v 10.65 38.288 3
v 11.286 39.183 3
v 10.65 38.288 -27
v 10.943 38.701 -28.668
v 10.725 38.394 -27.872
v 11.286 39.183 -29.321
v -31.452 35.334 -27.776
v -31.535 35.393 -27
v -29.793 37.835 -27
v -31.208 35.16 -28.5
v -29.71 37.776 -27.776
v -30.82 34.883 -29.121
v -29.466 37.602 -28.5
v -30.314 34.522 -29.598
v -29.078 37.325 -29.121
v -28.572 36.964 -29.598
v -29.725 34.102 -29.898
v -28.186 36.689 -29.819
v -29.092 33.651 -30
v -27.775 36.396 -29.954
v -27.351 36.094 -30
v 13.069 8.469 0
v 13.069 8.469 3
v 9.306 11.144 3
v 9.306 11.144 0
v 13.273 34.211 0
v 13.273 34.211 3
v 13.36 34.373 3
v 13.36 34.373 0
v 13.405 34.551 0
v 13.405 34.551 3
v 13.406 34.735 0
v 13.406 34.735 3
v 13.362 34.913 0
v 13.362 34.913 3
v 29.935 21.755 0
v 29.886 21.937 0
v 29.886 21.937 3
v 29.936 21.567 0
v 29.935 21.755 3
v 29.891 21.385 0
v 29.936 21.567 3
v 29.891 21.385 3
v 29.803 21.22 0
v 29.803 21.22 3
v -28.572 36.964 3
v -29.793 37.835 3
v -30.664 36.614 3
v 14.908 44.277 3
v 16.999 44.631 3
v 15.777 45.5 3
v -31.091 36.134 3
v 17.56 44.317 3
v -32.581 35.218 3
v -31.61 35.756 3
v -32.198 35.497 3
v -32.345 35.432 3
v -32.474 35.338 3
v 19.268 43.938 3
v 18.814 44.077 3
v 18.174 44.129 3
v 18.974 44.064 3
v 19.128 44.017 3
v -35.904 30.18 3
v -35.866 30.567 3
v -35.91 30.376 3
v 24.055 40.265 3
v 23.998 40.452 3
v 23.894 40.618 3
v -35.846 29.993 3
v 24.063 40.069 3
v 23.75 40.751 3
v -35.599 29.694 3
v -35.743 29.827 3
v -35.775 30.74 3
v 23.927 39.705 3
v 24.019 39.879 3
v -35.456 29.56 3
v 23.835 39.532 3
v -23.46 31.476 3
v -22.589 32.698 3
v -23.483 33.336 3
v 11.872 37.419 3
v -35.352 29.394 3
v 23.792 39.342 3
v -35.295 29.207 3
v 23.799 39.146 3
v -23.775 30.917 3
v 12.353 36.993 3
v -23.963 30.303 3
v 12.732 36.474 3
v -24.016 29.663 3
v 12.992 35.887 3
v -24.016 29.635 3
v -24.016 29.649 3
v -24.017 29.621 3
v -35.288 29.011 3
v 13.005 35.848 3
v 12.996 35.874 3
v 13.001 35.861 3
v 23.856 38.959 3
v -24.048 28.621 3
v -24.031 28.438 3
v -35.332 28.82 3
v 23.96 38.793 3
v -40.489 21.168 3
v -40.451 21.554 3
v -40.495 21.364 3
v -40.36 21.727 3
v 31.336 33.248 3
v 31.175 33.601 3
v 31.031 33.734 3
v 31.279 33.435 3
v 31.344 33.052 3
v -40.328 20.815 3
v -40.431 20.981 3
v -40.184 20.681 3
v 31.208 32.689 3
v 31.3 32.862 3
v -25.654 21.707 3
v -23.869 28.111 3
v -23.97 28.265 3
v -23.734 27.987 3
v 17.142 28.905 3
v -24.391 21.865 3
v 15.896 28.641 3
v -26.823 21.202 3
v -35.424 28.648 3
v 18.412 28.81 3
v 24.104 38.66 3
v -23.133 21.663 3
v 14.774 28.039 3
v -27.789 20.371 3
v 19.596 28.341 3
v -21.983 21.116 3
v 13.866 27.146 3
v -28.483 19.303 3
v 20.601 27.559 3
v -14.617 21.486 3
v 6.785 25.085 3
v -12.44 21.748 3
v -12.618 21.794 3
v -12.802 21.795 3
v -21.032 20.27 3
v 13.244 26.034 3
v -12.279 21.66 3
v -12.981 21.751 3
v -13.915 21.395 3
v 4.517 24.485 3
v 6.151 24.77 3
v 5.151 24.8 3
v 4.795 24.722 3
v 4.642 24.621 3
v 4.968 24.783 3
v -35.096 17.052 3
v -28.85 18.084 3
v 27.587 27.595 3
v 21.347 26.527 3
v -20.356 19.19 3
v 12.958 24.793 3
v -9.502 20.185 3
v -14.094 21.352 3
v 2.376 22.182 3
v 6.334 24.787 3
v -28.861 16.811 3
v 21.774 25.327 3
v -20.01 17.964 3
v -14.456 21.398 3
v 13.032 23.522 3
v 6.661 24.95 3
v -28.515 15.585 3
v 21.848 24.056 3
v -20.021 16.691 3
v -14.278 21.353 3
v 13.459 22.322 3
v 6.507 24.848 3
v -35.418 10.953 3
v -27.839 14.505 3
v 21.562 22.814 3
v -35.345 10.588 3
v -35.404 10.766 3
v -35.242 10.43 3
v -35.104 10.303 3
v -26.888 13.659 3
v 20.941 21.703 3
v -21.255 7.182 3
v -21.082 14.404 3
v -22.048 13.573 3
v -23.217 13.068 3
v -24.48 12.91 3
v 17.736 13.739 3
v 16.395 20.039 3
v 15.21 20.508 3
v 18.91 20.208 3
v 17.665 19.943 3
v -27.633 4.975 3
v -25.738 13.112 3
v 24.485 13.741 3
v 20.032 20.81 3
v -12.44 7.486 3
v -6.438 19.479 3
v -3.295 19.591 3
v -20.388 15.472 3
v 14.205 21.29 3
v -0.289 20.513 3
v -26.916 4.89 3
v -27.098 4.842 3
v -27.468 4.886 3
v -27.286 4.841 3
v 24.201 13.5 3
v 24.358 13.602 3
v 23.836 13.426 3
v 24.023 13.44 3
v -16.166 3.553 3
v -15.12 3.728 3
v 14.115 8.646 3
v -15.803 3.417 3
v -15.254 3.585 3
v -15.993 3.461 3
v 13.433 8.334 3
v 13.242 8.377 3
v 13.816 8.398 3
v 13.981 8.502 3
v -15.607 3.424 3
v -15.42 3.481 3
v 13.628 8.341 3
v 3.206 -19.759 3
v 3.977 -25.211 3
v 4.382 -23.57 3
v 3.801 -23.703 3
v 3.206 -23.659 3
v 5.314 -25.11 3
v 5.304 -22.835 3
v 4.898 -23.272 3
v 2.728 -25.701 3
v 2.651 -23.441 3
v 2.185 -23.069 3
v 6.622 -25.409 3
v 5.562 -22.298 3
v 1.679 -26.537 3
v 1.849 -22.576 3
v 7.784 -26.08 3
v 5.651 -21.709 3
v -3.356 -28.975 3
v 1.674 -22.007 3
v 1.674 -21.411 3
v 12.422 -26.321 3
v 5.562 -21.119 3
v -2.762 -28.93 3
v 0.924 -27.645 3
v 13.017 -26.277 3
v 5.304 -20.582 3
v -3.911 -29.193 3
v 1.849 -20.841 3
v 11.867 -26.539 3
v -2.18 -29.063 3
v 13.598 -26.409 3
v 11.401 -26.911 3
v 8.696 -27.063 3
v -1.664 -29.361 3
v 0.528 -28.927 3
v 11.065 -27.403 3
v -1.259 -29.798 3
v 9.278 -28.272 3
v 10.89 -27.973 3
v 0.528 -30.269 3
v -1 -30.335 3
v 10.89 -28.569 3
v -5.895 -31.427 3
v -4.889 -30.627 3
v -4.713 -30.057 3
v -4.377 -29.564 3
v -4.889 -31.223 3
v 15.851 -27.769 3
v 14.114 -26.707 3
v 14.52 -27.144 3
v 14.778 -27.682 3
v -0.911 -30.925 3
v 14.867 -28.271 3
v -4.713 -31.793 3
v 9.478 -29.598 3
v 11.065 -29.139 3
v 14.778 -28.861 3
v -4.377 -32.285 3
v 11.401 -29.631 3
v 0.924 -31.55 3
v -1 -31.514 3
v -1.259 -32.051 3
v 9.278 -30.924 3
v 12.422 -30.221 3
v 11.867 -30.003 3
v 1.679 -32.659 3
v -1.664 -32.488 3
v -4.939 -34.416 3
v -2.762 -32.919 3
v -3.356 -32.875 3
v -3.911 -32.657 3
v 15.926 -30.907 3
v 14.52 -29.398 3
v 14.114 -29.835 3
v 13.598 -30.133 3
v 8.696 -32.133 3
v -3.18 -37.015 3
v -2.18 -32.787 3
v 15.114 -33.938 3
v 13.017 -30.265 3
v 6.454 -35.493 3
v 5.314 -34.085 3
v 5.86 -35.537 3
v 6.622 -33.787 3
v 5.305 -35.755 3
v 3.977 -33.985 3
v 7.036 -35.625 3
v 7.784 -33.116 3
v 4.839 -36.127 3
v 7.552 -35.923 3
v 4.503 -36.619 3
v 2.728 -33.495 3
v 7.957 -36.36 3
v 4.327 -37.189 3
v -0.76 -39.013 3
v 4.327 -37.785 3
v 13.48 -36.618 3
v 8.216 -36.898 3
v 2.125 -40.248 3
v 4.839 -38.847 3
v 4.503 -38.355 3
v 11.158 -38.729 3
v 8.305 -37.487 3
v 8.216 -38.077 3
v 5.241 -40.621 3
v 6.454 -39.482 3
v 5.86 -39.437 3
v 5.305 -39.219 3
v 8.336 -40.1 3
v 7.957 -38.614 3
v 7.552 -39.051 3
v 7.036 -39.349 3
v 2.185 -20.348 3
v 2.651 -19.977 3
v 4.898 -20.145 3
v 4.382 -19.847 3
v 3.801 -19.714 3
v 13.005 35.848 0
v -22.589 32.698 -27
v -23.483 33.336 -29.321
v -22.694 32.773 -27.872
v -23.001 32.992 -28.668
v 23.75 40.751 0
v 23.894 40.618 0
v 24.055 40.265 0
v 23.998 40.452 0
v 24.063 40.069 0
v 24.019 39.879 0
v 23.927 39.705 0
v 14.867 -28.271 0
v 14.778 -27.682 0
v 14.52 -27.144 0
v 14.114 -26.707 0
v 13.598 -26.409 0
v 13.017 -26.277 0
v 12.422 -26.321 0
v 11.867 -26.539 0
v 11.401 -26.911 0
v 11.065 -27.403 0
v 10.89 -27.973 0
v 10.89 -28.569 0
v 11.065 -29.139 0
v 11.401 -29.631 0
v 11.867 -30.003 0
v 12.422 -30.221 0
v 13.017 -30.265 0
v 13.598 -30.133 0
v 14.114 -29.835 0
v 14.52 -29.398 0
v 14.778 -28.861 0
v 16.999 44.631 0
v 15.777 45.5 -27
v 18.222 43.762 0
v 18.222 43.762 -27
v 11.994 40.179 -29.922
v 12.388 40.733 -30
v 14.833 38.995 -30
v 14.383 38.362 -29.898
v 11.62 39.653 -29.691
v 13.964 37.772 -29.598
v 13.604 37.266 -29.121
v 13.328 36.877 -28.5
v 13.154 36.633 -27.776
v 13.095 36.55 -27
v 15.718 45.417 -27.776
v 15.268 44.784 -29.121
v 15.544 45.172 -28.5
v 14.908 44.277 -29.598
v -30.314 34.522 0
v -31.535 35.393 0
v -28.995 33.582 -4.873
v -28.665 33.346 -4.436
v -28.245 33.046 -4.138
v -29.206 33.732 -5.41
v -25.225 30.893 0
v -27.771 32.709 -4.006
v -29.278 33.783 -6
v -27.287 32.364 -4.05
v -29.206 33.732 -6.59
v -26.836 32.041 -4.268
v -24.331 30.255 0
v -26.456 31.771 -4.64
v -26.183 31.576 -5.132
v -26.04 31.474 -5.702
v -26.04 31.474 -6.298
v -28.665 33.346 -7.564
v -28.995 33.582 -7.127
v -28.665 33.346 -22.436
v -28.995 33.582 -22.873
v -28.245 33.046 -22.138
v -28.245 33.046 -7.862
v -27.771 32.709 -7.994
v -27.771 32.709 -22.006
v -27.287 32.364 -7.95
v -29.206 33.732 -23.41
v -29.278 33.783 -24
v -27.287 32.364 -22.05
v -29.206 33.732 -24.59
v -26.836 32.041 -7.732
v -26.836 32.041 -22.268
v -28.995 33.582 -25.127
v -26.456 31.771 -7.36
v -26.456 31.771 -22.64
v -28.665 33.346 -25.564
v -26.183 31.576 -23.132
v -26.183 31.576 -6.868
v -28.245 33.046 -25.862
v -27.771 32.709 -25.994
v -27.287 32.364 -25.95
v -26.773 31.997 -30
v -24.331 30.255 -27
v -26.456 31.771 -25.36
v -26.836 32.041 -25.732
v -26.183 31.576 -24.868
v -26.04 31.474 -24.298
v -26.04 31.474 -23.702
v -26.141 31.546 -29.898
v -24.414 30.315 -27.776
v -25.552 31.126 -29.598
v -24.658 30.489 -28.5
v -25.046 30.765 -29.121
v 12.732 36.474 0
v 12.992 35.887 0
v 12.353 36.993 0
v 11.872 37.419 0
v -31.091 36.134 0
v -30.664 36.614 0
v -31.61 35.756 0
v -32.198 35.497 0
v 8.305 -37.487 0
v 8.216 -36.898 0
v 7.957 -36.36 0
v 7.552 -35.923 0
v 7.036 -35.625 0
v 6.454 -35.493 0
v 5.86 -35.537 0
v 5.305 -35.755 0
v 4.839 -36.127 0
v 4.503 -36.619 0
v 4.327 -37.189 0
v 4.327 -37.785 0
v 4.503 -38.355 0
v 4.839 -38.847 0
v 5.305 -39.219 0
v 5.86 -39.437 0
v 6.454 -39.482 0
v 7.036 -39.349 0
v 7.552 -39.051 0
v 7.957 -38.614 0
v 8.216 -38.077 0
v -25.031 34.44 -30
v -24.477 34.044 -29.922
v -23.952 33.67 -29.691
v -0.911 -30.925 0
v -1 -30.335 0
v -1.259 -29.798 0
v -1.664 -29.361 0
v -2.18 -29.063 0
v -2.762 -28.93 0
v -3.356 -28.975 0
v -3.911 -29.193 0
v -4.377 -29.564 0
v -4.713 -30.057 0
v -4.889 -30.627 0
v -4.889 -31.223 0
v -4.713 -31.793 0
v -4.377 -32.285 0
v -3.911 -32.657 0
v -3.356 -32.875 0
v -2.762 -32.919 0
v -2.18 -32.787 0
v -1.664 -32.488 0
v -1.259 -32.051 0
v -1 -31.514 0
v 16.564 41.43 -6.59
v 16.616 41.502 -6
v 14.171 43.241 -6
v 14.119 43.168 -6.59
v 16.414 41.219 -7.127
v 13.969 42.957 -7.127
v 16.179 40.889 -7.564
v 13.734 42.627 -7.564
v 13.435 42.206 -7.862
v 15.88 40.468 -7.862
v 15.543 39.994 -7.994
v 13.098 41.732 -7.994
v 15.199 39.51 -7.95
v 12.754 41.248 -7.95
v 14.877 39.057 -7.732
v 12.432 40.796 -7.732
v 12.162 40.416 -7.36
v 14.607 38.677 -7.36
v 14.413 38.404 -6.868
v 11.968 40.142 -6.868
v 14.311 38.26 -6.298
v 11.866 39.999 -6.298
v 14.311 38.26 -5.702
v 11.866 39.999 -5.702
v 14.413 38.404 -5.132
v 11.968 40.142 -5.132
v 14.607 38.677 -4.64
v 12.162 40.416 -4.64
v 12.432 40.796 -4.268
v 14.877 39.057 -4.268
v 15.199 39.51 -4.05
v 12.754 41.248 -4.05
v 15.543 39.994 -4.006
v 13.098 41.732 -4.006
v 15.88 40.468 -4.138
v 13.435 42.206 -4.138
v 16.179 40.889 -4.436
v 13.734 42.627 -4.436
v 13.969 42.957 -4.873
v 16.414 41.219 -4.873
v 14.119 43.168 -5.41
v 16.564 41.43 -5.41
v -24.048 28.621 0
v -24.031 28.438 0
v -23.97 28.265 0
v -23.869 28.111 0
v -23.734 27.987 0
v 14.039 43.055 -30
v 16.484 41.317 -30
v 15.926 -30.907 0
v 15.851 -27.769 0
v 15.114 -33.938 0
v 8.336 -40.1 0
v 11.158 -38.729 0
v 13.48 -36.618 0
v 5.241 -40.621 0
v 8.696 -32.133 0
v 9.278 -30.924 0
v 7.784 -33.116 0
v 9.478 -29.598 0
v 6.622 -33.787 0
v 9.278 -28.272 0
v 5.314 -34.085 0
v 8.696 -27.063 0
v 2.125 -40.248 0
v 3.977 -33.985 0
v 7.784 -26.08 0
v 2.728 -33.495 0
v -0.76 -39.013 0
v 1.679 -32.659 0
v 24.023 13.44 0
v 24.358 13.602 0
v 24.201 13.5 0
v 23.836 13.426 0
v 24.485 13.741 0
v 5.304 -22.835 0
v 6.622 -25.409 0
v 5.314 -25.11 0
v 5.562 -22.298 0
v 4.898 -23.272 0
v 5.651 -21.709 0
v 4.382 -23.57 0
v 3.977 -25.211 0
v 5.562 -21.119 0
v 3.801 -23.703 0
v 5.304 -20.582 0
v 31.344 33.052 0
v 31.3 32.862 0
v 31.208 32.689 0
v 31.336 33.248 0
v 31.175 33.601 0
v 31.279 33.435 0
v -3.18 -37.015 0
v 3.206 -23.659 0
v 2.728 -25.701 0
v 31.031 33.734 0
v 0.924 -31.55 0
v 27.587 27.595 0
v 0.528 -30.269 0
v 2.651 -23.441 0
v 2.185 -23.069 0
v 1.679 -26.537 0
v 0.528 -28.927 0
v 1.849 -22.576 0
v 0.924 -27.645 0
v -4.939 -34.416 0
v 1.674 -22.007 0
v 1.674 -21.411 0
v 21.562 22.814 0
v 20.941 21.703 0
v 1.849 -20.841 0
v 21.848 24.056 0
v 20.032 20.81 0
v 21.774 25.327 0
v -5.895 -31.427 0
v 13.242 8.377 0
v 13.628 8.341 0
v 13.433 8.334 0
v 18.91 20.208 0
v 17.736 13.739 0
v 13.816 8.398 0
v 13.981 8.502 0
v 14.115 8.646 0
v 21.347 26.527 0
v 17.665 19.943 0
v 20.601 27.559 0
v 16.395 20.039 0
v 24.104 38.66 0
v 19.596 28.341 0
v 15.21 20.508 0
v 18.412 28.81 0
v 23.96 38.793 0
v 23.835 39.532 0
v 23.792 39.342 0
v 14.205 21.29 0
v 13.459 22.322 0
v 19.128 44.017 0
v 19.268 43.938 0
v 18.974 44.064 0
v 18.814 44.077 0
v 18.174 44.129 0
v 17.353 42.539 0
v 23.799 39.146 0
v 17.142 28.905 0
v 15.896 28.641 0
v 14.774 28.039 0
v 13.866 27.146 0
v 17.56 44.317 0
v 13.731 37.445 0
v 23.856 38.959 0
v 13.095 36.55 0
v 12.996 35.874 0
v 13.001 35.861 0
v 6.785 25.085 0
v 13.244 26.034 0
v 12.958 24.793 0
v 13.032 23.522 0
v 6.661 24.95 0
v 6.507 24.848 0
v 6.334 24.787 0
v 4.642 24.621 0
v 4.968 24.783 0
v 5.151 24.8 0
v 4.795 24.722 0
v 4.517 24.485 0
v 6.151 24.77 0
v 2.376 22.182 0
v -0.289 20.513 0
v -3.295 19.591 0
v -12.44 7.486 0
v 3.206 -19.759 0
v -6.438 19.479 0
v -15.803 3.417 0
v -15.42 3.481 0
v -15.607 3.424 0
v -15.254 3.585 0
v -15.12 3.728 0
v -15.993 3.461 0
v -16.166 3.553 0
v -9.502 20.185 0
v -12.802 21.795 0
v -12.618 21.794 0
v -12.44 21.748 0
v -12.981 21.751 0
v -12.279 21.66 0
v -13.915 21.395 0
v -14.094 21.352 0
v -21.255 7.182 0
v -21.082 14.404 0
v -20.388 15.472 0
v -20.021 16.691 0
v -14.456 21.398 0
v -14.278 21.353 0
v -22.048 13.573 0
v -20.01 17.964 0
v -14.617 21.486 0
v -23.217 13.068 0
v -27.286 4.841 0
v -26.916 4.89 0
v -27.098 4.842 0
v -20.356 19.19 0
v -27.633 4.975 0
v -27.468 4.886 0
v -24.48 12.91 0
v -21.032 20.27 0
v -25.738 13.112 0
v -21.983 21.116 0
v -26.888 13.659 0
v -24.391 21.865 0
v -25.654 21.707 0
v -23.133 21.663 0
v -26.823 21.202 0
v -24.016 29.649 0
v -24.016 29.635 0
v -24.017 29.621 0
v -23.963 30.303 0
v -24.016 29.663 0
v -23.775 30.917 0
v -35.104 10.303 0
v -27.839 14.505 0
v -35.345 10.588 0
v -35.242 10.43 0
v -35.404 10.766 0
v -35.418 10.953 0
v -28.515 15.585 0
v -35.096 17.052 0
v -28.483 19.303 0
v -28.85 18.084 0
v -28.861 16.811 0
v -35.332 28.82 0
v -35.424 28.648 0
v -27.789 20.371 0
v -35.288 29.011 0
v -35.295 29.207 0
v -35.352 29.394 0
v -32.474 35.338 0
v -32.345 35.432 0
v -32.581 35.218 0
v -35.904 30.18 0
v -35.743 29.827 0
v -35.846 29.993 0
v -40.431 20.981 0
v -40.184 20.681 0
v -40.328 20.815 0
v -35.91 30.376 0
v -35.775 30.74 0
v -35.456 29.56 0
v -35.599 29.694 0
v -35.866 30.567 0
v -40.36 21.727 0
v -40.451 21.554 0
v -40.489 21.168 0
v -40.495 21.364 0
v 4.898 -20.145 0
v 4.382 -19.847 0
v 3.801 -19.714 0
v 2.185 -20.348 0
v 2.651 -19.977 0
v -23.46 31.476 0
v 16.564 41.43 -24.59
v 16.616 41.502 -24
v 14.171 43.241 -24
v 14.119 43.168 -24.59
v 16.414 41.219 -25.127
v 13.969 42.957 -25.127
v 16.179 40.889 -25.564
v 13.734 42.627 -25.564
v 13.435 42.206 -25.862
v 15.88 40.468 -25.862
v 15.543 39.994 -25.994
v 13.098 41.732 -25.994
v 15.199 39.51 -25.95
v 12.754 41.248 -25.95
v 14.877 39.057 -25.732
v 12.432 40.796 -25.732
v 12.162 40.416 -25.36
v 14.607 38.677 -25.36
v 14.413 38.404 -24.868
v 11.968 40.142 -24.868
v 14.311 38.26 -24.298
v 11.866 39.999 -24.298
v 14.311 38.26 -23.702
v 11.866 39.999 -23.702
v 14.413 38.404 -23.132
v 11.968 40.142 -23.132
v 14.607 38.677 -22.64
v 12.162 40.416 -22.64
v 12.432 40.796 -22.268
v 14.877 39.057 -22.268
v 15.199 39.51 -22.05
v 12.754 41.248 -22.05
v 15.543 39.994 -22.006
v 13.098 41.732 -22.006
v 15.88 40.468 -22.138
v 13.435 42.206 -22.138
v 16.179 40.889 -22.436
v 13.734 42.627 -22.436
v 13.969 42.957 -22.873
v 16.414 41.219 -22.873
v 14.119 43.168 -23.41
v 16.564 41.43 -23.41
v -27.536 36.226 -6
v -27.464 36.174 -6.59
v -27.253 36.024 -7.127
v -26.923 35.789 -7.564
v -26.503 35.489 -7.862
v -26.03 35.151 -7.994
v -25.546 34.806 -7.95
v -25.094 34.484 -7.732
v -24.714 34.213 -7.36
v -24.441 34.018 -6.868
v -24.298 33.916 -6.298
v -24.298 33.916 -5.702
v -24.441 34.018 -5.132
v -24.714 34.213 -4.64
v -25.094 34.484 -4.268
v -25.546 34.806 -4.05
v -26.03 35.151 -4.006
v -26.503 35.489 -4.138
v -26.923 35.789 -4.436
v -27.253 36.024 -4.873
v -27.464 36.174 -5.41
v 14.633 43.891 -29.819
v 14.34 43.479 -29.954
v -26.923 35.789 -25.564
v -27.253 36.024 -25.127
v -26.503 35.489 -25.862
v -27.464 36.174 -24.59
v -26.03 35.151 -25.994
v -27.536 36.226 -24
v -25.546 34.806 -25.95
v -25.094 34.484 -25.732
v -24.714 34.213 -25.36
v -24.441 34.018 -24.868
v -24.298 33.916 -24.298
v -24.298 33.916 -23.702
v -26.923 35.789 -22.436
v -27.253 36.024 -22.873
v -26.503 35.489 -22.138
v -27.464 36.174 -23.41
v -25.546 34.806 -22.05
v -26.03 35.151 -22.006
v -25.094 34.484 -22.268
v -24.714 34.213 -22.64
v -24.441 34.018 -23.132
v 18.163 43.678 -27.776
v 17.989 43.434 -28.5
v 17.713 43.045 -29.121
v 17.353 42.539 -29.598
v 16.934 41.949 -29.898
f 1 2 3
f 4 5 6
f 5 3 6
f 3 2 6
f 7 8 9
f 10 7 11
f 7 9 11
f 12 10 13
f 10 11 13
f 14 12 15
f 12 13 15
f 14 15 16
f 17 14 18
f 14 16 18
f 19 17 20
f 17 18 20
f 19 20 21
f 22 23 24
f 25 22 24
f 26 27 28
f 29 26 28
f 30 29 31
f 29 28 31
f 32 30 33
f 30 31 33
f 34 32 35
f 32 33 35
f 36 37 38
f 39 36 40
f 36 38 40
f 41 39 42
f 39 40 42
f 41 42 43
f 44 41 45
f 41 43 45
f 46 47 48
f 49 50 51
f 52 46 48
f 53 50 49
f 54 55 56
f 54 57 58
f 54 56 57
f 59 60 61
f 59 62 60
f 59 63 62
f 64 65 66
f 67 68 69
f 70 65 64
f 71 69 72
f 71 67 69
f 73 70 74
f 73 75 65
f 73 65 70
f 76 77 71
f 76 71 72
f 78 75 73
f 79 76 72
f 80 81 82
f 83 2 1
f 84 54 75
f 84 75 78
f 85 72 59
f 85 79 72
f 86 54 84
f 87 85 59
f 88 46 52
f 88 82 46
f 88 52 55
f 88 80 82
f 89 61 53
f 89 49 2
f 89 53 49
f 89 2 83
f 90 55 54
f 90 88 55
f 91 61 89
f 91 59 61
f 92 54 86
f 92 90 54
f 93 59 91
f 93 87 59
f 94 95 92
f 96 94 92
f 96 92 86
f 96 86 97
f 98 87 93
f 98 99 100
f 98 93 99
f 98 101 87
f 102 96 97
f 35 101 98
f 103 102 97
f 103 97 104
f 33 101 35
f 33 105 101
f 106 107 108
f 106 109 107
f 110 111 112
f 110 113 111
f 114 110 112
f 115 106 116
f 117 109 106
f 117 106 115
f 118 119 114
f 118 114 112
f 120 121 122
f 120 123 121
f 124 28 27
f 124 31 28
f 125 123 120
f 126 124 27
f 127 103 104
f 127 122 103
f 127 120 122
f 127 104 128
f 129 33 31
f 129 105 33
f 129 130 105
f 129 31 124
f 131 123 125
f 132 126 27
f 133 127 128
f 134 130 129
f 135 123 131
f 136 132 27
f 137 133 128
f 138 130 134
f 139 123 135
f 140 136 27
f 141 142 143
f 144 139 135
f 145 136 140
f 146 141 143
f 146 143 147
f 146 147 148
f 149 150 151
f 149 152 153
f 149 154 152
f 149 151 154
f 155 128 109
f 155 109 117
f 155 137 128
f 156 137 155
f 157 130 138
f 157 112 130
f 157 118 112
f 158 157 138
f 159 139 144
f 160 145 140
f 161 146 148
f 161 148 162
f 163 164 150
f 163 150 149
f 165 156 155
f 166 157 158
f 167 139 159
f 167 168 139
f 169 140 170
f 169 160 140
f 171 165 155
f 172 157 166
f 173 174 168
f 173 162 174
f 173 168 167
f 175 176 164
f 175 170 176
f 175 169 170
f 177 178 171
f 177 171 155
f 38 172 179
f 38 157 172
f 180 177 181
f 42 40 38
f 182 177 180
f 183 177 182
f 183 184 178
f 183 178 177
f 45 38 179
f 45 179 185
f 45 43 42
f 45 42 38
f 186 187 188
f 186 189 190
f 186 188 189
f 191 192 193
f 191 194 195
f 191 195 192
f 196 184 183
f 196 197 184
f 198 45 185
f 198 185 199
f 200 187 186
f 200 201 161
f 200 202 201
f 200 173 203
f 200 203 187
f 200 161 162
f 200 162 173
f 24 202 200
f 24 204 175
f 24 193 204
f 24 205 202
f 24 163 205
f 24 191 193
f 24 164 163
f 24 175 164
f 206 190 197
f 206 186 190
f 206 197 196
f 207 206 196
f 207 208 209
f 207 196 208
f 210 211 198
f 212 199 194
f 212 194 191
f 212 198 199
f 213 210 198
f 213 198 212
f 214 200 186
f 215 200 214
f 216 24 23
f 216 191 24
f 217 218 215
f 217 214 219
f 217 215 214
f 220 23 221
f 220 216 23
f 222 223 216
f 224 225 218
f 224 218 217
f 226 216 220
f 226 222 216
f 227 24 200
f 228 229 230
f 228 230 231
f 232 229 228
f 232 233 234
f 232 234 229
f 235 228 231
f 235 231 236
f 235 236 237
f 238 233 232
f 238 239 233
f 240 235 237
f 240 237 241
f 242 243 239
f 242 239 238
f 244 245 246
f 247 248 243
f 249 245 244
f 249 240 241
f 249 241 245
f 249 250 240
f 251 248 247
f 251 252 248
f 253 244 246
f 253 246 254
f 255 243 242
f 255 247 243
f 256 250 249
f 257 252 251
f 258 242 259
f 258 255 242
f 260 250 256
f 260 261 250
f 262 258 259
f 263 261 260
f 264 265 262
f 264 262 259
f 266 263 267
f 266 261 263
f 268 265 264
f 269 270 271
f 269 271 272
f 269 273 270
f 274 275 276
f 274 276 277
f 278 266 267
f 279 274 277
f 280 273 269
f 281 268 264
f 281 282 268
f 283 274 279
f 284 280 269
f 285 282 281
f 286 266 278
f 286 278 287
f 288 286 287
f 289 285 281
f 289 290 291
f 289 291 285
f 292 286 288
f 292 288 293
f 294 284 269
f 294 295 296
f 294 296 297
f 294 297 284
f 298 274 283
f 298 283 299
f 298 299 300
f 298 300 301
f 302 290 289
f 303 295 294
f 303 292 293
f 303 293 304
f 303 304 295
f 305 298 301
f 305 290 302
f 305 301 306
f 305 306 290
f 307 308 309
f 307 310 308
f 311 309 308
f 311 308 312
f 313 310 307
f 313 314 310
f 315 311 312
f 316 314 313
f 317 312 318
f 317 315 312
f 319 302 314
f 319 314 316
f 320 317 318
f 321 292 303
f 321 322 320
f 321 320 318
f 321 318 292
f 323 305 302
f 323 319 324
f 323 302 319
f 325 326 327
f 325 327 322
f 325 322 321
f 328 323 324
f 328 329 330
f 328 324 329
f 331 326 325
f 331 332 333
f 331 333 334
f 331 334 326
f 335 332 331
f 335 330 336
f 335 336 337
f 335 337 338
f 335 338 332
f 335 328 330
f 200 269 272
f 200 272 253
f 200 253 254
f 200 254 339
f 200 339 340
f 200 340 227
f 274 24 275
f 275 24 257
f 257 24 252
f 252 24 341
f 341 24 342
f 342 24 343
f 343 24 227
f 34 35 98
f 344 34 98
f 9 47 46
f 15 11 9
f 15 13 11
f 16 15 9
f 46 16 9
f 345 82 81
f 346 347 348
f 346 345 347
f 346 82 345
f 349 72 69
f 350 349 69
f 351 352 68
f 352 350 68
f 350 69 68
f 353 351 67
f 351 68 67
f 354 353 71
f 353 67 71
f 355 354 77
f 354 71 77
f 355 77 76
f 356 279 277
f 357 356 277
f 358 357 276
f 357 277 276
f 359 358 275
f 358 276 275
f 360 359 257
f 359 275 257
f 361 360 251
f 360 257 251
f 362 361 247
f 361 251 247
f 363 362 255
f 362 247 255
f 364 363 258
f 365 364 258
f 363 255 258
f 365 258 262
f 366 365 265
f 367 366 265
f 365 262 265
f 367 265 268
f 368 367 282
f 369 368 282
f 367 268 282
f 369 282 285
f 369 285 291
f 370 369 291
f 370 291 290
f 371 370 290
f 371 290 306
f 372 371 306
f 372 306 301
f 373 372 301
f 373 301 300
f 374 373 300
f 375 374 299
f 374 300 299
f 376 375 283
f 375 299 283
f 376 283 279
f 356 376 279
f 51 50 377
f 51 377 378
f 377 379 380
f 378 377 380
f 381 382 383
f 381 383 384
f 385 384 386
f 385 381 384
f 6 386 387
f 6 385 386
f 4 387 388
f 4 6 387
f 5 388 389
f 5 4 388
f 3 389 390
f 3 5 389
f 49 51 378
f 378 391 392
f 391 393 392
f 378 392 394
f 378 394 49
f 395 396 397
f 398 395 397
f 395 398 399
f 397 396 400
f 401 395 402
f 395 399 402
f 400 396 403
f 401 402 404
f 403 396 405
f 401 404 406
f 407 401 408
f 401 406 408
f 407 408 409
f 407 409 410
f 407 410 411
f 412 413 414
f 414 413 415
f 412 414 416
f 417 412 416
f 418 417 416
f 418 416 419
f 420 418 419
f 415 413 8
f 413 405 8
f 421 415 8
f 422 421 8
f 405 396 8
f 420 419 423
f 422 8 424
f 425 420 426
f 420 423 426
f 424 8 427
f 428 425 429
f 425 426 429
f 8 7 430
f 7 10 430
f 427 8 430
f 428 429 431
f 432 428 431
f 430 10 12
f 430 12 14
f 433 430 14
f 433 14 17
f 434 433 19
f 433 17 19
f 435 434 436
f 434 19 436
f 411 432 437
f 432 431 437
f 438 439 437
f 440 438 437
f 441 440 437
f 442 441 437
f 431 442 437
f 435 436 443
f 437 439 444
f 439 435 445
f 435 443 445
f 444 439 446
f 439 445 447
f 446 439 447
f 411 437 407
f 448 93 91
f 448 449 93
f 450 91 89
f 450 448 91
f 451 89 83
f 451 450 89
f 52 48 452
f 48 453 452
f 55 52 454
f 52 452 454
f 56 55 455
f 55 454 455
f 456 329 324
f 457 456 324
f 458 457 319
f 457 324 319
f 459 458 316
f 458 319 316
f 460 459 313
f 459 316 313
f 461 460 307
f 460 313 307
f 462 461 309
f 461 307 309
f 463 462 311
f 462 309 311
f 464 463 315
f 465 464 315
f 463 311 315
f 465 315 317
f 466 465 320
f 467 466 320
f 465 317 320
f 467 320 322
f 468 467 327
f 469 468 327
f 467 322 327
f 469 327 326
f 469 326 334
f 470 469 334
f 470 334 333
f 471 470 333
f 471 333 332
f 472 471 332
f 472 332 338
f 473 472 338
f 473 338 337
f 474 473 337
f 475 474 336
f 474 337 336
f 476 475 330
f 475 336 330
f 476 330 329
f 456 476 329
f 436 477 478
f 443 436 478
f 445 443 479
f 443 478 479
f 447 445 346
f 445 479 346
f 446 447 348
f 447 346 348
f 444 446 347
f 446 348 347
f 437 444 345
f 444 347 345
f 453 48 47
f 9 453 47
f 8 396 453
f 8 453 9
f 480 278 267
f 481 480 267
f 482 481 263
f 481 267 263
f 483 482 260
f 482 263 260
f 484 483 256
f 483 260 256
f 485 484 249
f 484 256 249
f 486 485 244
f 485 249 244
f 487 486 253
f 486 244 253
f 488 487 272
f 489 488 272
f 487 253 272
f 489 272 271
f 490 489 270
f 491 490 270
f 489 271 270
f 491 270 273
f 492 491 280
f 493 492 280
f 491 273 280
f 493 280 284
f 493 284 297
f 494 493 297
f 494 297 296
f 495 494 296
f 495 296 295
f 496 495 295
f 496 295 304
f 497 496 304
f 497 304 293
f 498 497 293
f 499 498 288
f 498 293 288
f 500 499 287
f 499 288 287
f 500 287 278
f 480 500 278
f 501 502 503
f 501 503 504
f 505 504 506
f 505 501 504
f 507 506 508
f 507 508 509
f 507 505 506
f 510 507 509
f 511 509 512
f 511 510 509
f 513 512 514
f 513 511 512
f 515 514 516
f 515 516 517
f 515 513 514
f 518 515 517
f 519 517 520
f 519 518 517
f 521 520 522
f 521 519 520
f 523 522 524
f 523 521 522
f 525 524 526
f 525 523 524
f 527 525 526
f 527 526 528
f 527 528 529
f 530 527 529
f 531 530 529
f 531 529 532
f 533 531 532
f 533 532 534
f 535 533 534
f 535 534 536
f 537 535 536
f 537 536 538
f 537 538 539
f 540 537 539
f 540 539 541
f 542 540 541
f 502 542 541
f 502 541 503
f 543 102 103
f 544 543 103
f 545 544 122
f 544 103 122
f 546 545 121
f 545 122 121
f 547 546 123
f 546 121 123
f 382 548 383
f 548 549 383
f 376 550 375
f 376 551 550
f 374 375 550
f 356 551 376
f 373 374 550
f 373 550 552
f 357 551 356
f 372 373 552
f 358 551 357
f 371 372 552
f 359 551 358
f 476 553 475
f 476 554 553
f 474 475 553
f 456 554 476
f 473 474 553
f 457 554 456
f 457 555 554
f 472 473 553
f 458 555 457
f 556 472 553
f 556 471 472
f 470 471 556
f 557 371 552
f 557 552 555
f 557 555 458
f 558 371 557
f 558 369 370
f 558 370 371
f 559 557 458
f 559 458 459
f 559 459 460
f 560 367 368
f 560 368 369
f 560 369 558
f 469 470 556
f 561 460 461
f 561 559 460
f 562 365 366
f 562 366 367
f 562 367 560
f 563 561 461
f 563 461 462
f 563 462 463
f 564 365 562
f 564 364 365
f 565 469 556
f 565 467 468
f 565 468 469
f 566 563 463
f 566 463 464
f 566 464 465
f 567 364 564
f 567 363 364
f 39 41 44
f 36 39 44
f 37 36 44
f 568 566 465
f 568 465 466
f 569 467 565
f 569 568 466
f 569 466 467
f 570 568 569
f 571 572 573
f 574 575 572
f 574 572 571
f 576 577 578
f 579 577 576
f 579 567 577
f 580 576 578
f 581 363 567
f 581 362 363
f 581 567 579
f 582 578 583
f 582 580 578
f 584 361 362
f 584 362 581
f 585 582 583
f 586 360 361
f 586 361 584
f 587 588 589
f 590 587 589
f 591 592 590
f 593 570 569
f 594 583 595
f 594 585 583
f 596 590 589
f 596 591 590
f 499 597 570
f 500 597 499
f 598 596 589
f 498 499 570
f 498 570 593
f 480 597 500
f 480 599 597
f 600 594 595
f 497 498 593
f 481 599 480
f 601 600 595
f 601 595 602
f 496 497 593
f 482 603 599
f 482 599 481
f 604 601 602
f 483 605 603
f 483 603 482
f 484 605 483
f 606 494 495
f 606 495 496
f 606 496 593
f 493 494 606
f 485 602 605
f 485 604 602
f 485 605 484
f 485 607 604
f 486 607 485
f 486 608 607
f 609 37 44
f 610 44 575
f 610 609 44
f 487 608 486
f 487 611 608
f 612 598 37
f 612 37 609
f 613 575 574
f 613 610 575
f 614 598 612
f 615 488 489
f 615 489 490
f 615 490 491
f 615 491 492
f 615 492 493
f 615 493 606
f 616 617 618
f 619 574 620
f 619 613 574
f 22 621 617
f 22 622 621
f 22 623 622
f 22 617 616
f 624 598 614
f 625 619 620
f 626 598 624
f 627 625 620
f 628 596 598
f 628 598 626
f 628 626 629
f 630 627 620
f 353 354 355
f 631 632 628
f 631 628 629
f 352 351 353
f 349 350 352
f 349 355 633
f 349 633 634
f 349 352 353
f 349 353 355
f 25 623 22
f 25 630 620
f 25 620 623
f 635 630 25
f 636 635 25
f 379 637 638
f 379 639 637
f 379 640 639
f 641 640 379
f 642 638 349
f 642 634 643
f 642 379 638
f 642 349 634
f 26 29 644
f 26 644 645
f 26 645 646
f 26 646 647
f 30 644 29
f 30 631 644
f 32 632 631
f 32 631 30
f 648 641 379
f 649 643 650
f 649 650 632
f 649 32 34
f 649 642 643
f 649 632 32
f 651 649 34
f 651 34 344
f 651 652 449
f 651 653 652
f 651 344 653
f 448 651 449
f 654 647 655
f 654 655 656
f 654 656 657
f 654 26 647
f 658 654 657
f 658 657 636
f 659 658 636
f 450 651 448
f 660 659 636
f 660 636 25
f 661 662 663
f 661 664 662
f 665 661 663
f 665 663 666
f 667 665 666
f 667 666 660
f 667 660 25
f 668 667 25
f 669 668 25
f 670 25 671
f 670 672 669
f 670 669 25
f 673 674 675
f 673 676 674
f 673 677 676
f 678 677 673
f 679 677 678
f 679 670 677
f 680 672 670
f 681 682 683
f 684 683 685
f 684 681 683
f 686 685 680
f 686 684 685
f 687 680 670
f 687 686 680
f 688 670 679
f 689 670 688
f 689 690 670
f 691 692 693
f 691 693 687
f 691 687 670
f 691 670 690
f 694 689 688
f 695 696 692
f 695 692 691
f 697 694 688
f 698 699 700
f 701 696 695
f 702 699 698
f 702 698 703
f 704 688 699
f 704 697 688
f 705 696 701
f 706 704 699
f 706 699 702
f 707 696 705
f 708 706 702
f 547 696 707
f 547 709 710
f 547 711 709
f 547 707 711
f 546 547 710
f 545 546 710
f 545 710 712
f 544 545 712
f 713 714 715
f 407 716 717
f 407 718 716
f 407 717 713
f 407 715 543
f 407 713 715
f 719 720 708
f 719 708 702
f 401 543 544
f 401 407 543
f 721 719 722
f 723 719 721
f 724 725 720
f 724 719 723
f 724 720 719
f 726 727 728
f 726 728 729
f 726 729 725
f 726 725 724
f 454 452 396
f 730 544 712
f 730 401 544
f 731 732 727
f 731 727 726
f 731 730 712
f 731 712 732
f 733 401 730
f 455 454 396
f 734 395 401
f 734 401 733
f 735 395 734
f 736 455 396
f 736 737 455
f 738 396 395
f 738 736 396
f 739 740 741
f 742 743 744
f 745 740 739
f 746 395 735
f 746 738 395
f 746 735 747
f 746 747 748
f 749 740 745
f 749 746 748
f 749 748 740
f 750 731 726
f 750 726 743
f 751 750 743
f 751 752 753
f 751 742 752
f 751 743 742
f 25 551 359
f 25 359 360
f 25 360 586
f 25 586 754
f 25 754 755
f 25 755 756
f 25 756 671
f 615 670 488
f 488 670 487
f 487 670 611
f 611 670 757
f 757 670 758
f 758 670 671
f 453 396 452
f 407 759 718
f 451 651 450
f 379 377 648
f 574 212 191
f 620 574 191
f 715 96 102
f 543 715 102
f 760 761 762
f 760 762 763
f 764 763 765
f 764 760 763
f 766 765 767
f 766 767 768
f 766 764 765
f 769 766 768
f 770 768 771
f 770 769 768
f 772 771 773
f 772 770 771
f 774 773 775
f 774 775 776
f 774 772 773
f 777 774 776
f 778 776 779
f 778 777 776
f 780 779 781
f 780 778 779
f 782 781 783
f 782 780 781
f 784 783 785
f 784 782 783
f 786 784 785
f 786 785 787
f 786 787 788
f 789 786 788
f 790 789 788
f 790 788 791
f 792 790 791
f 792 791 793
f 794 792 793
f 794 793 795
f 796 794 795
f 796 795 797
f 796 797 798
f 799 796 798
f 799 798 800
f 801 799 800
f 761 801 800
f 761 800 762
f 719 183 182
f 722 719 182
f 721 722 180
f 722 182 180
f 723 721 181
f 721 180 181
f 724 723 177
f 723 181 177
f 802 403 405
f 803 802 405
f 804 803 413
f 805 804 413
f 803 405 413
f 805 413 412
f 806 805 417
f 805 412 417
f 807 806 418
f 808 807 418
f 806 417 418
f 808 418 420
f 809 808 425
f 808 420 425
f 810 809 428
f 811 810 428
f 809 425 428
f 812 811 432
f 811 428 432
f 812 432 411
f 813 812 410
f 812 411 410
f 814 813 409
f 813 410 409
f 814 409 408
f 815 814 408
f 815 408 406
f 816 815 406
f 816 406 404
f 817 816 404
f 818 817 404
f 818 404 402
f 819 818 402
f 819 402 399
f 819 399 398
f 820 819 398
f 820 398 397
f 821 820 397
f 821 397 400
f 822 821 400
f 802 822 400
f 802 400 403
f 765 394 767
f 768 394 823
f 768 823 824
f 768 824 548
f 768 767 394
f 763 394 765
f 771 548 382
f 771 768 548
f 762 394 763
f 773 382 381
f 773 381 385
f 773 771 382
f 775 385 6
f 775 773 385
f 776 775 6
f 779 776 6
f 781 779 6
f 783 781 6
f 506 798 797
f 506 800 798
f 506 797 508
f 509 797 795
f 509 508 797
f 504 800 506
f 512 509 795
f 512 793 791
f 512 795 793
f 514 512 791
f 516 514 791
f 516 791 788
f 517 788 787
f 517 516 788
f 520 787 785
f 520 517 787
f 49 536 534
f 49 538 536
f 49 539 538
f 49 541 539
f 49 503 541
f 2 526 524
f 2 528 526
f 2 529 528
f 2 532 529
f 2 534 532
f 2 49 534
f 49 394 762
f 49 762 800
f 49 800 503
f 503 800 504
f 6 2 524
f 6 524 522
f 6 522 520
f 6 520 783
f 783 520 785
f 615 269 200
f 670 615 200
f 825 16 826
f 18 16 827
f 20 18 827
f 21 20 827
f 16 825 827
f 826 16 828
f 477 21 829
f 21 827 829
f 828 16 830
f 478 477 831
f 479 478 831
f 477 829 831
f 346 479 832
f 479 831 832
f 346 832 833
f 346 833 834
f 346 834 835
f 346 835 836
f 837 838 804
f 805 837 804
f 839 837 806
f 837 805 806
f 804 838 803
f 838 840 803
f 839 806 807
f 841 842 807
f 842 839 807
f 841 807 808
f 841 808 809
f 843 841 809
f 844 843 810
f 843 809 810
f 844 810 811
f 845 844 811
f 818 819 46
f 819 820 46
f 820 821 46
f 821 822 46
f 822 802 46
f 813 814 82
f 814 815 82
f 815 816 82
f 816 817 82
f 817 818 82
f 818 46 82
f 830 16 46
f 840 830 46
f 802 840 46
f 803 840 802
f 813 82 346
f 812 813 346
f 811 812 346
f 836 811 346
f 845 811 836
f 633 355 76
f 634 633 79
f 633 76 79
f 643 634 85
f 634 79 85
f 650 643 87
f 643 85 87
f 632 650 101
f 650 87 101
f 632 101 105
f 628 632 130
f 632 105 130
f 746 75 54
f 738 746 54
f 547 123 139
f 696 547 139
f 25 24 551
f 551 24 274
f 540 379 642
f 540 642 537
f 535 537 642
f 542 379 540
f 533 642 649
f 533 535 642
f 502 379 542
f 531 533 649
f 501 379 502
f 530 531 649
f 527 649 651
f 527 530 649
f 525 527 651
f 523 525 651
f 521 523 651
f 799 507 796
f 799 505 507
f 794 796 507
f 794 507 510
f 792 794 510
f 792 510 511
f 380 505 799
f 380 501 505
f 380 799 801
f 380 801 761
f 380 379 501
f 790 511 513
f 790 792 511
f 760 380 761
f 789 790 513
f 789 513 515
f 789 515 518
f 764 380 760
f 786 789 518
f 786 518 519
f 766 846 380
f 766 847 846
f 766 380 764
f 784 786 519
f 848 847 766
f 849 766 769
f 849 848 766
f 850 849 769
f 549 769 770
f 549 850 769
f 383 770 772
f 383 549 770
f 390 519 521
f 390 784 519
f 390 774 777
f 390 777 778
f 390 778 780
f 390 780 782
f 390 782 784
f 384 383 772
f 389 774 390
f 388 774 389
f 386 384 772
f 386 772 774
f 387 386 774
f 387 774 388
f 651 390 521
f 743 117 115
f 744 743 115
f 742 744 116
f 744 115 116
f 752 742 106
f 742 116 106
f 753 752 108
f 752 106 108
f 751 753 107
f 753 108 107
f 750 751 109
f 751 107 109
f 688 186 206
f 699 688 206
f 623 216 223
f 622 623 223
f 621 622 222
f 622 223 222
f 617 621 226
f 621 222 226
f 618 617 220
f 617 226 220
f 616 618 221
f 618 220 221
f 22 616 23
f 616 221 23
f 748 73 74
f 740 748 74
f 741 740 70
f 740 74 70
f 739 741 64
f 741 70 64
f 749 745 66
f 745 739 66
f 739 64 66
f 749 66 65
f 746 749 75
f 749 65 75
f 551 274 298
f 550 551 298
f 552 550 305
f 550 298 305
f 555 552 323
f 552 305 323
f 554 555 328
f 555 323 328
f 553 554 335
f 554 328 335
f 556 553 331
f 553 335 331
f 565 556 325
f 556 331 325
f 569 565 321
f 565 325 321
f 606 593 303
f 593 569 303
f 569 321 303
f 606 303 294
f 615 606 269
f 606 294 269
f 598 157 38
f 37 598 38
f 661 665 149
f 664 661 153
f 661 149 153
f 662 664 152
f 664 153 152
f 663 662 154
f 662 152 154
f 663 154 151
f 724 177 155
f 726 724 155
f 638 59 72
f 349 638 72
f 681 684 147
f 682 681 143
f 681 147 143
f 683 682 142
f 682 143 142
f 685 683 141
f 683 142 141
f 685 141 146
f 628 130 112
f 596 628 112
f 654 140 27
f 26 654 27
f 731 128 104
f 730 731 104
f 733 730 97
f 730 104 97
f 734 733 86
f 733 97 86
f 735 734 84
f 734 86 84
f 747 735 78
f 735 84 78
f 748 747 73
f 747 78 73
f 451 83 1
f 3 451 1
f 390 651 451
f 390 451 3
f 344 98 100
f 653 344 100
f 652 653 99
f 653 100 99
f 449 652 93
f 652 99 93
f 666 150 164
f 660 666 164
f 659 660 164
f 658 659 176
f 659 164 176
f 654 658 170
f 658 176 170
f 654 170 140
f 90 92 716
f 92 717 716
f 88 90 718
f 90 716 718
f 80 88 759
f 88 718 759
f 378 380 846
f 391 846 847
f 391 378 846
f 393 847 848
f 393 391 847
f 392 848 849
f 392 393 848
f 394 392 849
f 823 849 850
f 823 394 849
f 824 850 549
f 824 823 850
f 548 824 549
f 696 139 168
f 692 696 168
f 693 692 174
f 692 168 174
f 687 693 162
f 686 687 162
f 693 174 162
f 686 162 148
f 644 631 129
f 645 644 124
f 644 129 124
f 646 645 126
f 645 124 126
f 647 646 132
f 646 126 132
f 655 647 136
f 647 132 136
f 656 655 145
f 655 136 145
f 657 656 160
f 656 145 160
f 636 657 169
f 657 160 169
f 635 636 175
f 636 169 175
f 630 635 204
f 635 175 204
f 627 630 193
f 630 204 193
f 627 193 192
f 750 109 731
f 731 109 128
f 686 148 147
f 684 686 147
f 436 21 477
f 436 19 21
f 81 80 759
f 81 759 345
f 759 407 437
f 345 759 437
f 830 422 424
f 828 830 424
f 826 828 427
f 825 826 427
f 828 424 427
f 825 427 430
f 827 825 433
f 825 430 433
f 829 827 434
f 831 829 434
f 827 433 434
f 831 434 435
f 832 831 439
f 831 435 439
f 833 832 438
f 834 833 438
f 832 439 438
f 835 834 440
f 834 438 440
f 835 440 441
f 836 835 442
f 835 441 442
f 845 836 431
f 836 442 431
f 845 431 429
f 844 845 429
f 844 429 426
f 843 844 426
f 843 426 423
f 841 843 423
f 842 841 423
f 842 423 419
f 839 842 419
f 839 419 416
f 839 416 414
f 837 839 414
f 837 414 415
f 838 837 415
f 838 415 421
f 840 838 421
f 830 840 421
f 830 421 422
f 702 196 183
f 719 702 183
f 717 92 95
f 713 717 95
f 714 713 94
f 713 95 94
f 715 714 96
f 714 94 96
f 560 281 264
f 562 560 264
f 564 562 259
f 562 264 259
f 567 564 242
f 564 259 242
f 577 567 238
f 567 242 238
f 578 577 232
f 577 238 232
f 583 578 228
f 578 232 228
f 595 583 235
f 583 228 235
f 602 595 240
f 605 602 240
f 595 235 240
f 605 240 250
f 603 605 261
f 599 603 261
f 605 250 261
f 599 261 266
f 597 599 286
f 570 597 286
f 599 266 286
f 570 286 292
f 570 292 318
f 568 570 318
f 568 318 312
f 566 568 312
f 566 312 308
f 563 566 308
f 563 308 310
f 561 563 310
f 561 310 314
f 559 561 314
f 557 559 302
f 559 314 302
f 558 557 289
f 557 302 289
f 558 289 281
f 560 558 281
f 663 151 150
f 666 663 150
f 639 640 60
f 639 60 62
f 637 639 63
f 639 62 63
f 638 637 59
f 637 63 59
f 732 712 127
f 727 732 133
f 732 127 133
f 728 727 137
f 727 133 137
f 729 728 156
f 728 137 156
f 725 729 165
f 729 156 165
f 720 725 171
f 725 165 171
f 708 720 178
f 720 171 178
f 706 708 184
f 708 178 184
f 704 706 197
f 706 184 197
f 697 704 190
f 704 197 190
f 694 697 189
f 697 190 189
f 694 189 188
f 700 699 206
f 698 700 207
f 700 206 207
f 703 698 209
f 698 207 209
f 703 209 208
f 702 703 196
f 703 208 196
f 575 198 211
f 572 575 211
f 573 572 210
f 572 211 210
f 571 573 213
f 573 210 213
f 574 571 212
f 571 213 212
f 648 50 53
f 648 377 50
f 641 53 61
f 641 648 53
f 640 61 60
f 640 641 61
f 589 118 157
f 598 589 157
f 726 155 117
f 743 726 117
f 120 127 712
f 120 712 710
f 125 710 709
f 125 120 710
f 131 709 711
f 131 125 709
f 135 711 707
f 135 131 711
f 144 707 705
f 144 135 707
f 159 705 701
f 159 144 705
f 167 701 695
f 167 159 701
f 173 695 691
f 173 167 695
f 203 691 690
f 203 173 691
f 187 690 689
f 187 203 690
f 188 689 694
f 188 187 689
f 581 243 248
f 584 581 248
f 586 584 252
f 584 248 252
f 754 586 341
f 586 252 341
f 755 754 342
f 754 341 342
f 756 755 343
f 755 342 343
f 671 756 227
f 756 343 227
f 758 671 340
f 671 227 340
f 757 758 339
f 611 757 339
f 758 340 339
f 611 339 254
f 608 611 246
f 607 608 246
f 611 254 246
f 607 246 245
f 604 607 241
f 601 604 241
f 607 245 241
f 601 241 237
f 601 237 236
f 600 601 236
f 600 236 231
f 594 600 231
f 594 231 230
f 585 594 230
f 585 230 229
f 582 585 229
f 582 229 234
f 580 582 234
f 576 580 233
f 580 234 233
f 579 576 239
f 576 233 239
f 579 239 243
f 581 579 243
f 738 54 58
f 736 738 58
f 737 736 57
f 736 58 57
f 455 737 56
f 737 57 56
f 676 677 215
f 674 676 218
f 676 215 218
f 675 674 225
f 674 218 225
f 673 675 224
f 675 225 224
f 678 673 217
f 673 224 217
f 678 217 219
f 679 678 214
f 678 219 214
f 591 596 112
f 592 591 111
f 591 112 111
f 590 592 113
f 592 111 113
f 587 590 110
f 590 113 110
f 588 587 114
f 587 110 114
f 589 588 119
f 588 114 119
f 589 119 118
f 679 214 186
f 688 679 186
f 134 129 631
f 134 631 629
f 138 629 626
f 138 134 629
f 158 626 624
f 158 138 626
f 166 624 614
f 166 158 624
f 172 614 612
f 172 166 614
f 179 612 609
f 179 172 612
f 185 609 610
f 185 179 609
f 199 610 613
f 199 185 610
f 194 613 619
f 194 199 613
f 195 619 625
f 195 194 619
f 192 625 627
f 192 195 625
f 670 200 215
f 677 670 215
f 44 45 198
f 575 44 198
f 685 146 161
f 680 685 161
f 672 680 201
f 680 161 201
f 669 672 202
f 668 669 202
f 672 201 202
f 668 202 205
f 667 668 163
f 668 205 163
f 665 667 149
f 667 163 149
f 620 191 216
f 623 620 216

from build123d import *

# Parameters (mm, degrees)
SKETCH_2_R          = 73.899050909
EXTRUDE_2_DEPTH     = 3
SKETCH_6_OUTSIDE_W  = 191.606
SKETCH_6_OUTSIDE_H  = 191.606
CUT_EXTRUDE_4_DEPTH = 10
SKETCH_7_R          = 4.5
SKETCH_7_R_2        = 2
CUT_EXTRUDE_5_DEPTH = 10
SKETCH_8_R          = 4.5
CUT_EXTRUDE_6_DEPTH = 10
SKETCH_9_W          = 6.25
SKETCH_9_H          = 33
SKETCH_9_R          = 2
EXTRUDE_3_DEPTH     = 20
SKETCH_10_W         = 6.25
SKETCH_10_H         = 30
CUT_EXTRUDE_7_DEPTH = 17
SKETCH_11_W         = 1.5
SKETCH_11_H         = 33
SKETCH_11_W_2       = 1.098612182
EXTRUDE_4_DEPTH     = 2.999995
FILLET_1_R          = 3


with BuildPart() as part:
    # 草图2 → 凸台-拉伸2 (new body)
    with BuildSketch(Plane.XY):
        Circle(SKETCH_2_R)
    extrude(amount=EXTRUDE_2_DEPTH)

    # 草图6 outside → 切除-拉伸4 (cut)
    with BuildSketch(Plane.XY.offset(3)):
        Rectangle(SKETCH_6_OUTSIDE_W, SKETCH_6_OUTSIDE_H)
        with BuildLine():
            Line((-31.535008434, 35.392907634), (-24.330725879, 30.255179498))
            ThreePointArc((-24.330725879, 30.255179498), (-24.094123176, 29.977447186), (-24.016566775, 29.6209348))
            Line((-24.016566775, 29.6209348), (-24.048055472, 28.621430692))
            ThreePointArc((-24.048055472, 28.621430692), (-23.970499071, 28.264918306), (-23.733896368, 27.987185994))
            Line((-23.733896368, 27.987185994), (-14.617442117, 21.485794197))
            ThreePointArc((-14.617442117, 21.485794197), (-14.277785331, 21.352567532), (-13.915454513, 21.395374713))
            Line((-13.915454513, 21.395374713), (-12.980724299, 21.750732881))
            ThreePointArc((-12.980724299, 21.750732881), (-12.618393481, 21.793540061), (-12.278736695, 21.660313397))
            ThreePointArc((-12.278736695, 21.660313397), (-3.294948021, 19.590594088), (4.517495731, 24.485276874))
            ThreePointArc((4.517495731, 24.485276874), (4.794882728, 24.722284322), (5.15128164, 24.800360515))
            Line((5.15128164, 24.800360515), (6.150830603, 24.770329354))
            ThreePointArc((6.150830603, 24.770329354), (6.507229515, 24.848405547), (6.784616512, 25.085412994))
            Line((6.784616512, 25.085412994), (13.272707556, 34.211338045))
            ThreePointArc((13.272707556, 34.211338045), (13.405438783, 34.551188744), (13.362103288, 34.913456755))
            Line((13.362103288, 34.913456755), (13.005382451, 35.847667782))
            ThreePointArc((13.005382451, 35.847667782), (12.962046956, 36.209935793), (13.094778183, 36.549786492))
            Line((13.094778183, 36.549786492), (18.221995392, 43.761553351))
            ThreePointArc((18.221995392, 43.761553351), (18.708323153, 44.066496264), (19.267836012, 43.938237808))
            Line((19.267836012, 43.938237808), (23.750427961, 40.751331876))
            ThreePointArc((23.750427961, 40.751331876), (24.055370874, 40.265004115), (23.927112418, 39.705491256))
            ThreePointArc((23.927112418, 39.705491256), (23.798853962, 39.145978396), (24.103796875, 38.659650636))
            Line((24.103796875, 38.659650636), (31.031438978, 33.734432377))
            ThreePointArc((31.031438978, 33.734432377), (31.336381891, 33.248104616), (31.208123435, 32.688591757))
            Line((31.208123435, 32.688591757), (27.586639421, 27.59473727))
            Line((27.586639421, 27.59473727), (29.886186599, 21.936685188))
            ThreePointArc((29.886186599, 21.936685188), (29.936337177, 21.567492307), (29.80264047, 21.219722765))
            Line((29.80264047, 21.219722765), (24.485385754, 13.740655704))
            ThreePointArc((24.485385754, 13.740655704), (24.200836556, 13.500134983), (23.835658301, 13.426220802))
            Line((23.835658301, 13.426220802), (17.736202905, 13.739453063))
            Line((17.736202905, 13.739453063), (14.114718892, 8.645598576))
            ThreePointArc((14.114718892, 8.645598576), (13.628391131, 8.340655663), (13.068878271, 8.468914119))
            Line((13.068878271, 8.468914119), (9.306333892, 11.143901076))
            Line((9.306333892, 11.143901076), (15.851133659, -27.769160612))
            ThreePointArc((15.851133659, -27.769160612), (6.806822505, -40.470956104), (-5.894972987, -31.42664495))
            Line((-5.894972987, -31.42664495), (-12.439772753, 7.486416738))
            Line((-12.439772753, 7.486416738), (-15.120243503, 3.727777092))
            ThreePointArc((-15.120243503, 3.727777092), (-15.607015422, 3.423543678), (-16.166340657, 3.552617894))
            Line((-16.166340657, 3.552617894), (-21.25490879, 7.181526042))
            Line((-21.25490879, 7.181526042), (-26.916308113, 4.890232022))
            ThreePointArc((-26.916308113, 4.890232022), (-27.285573732, 4.840619864), (-27.633147944, 4.974823555))
            Line((-27.633147944, 4.974823555), (-35.1044533, 10.30297878))
            ThreePointArc((-35.1044533, 10.30297878), (-35.344558829, 10.587878409), (-35.41794042, 10.953164059))
            Line((-35.41794042, 10.953164059), (-35.095814113, 17.052156207))
            Line((-35.095814113, 17.052156207), (-40.184382246, 20.681064356))
            ThreePointArc((-40.184382246, 20.681064356), (-40.48861566, 21.167836275), (-40.359541444, 21.727161509))
            Line((-40.359541444, 21.727161509), (-35.424226362, 28.647614171))
            ThreePointArc((-35.424226362, 28.647614171), (-35.295152147, 29.206939406), (-35.59938556, 29.693711325))
            ThreePointArc((-35.59938556, 29.693711325), (-35.903618974, 30.180483244), (-35.774544759, 30.739808479))
            Line((-35.774544759, 30.739808479), (-32.581105588, 35.217748436))
            ThreePointArc((-32.581105588, 35.217748436), (-32.094333668, 35.521981849), (-31.535008434, 35.392907634))
        make_face(mode=Mode.SUBTRACT)
    extrude(amount=-CUT_EXTRUDE_4_DEPTH, mode=Mode.SUBTRACT)

    # 草图7 → 切除-拉伸5 (cut)
    with BuildSketch(Plane.XY.offset(3)):
        with Locations((4.978080336, -29.597902781)):
            Circle(SKETCH_7_R)
        with Locations((3.651194467, -21.708709293)):
            Circle(SKETCH_7_R_2)
        with Locations((12.867273824, -28.271016911)):
            Circle(SKETCH_7_R_2)
        with Locations((6.304966206, -37.487096269)):
            Circle(SKETCH_7_R_2)
        with Locations((-2.911113152, -30.924788651)):
            Circle(SKETCH_7_R_2)
    extrude(amount=-CUT_EXTRUDE_5_DEPTH, mode=Mode.SUBTRACT)

    # 草图8 → 切除-拉伸6 (cut)
    with BuildSketch(Plane.XY.offset(3)):
        with Locations((-24.401296977, 17.408951983)):
            Circle(SKETCH_8_R)
        with Locations((17.442589177, 24.41531991)):
            Circle(SKETCH_8_R)
    extrude(amount=-CUT_EXTRUDE_6_DEPTH, mode=Mode.SUBTRACT)

    # 镜向3: part across plane


with BuildPart() as part_1:
    add(part.part)
    add(part.part.mirror(Plane(origin=(0, 0, 0), x_dir=(0, 0, 1), z_dir=(-0.9861491859840638, -0.16586073369839163, 0))))

    # 草图9 → 凸台-拉伸3 (add)
    with BuildSketch(Plane(origin=(-3.770666854, -5.287346609, 0), x_dir=(0.814170901346189, -0.5806253037899178, 0), z_dir=(-0.5806253037899178, -0.814170901346189, 0))):
        with Locations((-41.599903988, -13.5)):
            Rectangle(SKETCH_9_W, SKETCH_9_H)
        with Locations(Location((-41.452827346, -24, 0), (0, 0, 180))):
            Circle(SKETCH_9_R, mode=Mode.SUBTRACT)
        with Locations(Location((-41.452827346, -6, 0), (0, 0, 180))):
            Circle(SKETCH_9_R, mode=Mode.SUBTRACT)
    extrude(amount=-EXTRUDE_3_DEPTH)

    # 草图10 → 切除-拉伸7 (cut)
    with BuildSketch(Plane(origin=(-3.770666854, -5.287346609, 0), x_dir=(0.8141709013461893, -0.5806253037899172, 0), z_dir=(-0.5806253037899172, -0.8141709013461893, 0))):
        with Locations((-41.599903988, -15)):
            Rectangle(SKETCH_10_W, SKETCH_10_H)
    extrude(amount=-CUT_EXTRUDE_7_DEPTH, mode=Mode.SUBTRACT)

    # 草图11 → 凸台-拉伸4 (add)
    with BuildSketch(Plane(origin=(6.09996331, 8.553558714, 0), x_dir=(0.8141709013461892, -0.5806253037899176, 0), z_dir=(0.5806253037899175, 0.8141709013461891, 0))):
        with Locations((-45.474903988, 13.5)):
            Rectangle(SKETCH_11_W, SKETCH_11_H)
        with Locations((-37.925597897, 13.5)):
            Rectangle(SKETCH_11_W_2, SKETCH_11_H)
    extrude(amount=EXTRUDE_4_DEPTH)

    # 圆角1
    fillet_1_edges = [part_1.edges().sort_by_distance(p)[0] for p in [
        (-31.535008434, 35.392907634, 1.5),
        (-24.330725879, 30.255179498, 1.5),
        (-23.459789375, 31.476433815, -30),
        (-30.66407193, 36.614161951, -30),
    ]]
    fillet(fillet_1_edges, radius=FILLET_1_R)

    # 镜向4: part across plane


with BuildPart() as part_2:
    add(part_1.part)
    add(part_1.part.mirror(Plane(origin=(0, 0, 0), x_dir=(0, 0, 1), z_dir=(-0.9861491859840638, -0.16586073369839163, 0))))


solid = part_2.part
